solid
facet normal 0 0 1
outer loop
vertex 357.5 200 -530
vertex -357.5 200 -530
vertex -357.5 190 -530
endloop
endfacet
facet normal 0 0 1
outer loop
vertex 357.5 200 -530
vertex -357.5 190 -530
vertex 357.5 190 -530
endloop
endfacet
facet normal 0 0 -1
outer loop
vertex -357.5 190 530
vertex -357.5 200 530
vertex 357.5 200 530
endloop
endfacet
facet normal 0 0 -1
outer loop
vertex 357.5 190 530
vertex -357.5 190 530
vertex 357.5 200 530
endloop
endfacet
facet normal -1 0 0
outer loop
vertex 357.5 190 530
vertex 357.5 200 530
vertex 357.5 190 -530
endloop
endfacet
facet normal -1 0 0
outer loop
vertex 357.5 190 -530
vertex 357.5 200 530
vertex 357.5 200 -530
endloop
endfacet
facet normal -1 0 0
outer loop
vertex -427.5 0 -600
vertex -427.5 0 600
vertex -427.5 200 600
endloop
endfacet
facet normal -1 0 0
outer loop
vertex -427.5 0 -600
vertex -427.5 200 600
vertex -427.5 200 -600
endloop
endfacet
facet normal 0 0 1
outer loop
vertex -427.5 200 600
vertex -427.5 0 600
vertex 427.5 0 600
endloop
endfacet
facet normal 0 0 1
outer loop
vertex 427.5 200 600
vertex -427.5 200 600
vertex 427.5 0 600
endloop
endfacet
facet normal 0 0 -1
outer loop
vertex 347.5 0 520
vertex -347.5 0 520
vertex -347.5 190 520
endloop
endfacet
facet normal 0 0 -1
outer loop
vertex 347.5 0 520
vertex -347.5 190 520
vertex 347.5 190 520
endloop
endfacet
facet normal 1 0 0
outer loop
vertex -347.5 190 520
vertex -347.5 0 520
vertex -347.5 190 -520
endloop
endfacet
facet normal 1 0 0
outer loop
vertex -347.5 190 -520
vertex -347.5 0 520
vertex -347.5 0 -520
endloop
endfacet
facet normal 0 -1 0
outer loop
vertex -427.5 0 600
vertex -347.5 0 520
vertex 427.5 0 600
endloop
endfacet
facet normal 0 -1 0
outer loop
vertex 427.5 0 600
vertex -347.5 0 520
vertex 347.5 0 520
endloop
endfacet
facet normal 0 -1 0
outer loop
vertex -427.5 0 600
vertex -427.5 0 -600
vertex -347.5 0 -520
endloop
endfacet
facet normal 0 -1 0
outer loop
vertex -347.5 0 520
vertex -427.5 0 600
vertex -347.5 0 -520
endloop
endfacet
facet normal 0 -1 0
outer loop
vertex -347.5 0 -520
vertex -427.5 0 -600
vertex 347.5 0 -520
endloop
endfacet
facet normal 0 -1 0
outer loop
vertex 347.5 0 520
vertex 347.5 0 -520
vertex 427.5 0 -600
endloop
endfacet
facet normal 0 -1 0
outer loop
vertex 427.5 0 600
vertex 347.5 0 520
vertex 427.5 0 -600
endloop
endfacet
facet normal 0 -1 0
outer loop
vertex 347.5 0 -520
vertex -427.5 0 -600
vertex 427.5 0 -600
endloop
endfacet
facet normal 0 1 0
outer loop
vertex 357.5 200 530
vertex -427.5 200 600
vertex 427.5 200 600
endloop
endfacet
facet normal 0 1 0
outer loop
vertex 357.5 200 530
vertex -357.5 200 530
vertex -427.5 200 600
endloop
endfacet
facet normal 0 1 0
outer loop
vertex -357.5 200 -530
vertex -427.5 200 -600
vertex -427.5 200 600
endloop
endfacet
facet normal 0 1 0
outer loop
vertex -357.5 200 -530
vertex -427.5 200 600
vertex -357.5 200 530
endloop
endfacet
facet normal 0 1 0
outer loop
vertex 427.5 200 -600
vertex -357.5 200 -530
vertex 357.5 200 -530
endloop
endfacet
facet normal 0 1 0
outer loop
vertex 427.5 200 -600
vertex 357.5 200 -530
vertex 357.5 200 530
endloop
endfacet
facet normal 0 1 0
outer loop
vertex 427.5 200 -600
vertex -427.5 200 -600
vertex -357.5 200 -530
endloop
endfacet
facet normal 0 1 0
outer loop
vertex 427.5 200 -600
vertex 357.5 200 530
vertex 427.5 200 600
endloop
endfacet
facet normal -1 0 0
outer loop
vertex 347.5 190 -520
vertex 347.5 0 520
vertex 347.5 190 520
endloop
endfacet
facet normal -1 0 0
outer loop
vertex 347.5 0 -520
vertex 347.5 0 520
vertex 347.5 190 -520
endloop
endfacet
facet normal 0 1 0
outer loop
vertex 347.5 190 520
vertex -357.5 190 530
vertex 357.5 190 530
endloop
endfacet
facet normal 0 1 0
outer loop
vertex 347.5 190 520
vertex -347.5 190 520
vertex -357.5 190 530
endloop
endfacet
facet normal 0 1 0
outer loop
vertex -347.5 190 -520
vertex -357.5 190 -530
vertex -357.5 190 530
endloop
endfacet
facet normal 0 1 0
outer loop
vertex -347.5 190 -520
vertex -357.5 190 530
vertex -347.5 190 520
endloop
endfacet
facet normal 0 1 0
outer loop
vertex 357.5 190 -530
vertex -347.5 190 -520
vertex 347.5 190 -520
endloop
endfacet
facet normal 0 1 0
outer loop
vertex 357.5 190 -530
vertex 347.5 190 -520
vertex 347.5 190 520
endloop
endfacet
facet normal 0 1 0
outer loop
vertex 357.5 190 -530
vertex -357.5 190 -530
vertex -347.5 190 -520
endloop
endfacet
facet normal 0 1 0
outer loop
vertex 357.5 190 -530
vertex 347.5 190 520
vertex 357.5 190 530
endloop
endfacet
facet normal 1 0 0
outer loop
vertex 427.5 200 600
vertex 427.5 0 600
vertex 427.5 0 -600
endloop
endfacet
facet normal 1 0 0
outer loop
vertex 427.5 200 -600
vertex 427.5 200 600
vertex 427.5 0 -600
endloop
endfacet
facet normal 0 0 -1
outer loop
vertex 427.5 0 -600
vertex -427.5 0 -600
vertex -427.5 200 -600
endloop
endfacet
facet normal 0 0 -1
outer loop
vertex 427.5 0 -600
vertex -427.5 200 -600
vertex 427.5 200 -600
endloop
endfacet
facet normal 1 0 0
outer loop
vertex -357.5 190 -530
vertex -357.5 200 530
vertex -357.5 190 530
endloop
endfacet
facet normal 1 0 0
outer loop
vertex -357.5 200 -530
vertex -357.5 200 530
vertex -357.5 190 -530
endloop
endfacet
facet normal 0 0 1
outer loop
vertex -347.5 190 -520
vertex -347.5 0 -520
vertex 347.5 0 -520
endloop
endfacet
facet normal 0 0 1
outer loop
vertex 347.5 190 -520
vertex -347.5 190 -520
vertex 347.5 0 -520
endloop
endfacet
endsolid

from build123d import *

# Parameters (mm, degrees)
SKETCH_1_W          = 855
SKETCH_1_H          = 1200
SKETCH_1_W_2        = 695
SKETCH_1_H_2        = 1040
EXTRUDE_1_DEPTH     = 200
SKETCH_2_W          = 715
SKETCH_2_H          = 1060
CUT_EXTRUDE_1_DEPTH = 10


with BuildPart() as part:
    # Эскиз1 → Вытянуть-Тонкостенный1 (new body)
    with BuildSketch(Plane(origin=(0, 0, 0), x_dir=(1, 0, 0), z_dir=(0, 1, 0))):
        Rectangle(SKETCH_1_W, SKETCH_1_H)
        Rectangle(SKETCH_1_W_2, SKETCH_1_H_2, mode=Mode.SUBTRACT)
    extrude(amount=EXTRUDE_1_DEPTH)

    # Эскиз2 → Вырез-Вытянуть1 (cut)
    with BuildSketch(Plane(origin=(0, 200, 0), x_dir=(1, 0, 0), z_dir=(0, 1, 0))):
        Rectangle(SKETCH_2_W, SKETCH_2_H)
    extrude(amount=-CUT_EXTRUDE_1_DEPTH, mode=Mode.SUBTRACT)


solid = part.part
